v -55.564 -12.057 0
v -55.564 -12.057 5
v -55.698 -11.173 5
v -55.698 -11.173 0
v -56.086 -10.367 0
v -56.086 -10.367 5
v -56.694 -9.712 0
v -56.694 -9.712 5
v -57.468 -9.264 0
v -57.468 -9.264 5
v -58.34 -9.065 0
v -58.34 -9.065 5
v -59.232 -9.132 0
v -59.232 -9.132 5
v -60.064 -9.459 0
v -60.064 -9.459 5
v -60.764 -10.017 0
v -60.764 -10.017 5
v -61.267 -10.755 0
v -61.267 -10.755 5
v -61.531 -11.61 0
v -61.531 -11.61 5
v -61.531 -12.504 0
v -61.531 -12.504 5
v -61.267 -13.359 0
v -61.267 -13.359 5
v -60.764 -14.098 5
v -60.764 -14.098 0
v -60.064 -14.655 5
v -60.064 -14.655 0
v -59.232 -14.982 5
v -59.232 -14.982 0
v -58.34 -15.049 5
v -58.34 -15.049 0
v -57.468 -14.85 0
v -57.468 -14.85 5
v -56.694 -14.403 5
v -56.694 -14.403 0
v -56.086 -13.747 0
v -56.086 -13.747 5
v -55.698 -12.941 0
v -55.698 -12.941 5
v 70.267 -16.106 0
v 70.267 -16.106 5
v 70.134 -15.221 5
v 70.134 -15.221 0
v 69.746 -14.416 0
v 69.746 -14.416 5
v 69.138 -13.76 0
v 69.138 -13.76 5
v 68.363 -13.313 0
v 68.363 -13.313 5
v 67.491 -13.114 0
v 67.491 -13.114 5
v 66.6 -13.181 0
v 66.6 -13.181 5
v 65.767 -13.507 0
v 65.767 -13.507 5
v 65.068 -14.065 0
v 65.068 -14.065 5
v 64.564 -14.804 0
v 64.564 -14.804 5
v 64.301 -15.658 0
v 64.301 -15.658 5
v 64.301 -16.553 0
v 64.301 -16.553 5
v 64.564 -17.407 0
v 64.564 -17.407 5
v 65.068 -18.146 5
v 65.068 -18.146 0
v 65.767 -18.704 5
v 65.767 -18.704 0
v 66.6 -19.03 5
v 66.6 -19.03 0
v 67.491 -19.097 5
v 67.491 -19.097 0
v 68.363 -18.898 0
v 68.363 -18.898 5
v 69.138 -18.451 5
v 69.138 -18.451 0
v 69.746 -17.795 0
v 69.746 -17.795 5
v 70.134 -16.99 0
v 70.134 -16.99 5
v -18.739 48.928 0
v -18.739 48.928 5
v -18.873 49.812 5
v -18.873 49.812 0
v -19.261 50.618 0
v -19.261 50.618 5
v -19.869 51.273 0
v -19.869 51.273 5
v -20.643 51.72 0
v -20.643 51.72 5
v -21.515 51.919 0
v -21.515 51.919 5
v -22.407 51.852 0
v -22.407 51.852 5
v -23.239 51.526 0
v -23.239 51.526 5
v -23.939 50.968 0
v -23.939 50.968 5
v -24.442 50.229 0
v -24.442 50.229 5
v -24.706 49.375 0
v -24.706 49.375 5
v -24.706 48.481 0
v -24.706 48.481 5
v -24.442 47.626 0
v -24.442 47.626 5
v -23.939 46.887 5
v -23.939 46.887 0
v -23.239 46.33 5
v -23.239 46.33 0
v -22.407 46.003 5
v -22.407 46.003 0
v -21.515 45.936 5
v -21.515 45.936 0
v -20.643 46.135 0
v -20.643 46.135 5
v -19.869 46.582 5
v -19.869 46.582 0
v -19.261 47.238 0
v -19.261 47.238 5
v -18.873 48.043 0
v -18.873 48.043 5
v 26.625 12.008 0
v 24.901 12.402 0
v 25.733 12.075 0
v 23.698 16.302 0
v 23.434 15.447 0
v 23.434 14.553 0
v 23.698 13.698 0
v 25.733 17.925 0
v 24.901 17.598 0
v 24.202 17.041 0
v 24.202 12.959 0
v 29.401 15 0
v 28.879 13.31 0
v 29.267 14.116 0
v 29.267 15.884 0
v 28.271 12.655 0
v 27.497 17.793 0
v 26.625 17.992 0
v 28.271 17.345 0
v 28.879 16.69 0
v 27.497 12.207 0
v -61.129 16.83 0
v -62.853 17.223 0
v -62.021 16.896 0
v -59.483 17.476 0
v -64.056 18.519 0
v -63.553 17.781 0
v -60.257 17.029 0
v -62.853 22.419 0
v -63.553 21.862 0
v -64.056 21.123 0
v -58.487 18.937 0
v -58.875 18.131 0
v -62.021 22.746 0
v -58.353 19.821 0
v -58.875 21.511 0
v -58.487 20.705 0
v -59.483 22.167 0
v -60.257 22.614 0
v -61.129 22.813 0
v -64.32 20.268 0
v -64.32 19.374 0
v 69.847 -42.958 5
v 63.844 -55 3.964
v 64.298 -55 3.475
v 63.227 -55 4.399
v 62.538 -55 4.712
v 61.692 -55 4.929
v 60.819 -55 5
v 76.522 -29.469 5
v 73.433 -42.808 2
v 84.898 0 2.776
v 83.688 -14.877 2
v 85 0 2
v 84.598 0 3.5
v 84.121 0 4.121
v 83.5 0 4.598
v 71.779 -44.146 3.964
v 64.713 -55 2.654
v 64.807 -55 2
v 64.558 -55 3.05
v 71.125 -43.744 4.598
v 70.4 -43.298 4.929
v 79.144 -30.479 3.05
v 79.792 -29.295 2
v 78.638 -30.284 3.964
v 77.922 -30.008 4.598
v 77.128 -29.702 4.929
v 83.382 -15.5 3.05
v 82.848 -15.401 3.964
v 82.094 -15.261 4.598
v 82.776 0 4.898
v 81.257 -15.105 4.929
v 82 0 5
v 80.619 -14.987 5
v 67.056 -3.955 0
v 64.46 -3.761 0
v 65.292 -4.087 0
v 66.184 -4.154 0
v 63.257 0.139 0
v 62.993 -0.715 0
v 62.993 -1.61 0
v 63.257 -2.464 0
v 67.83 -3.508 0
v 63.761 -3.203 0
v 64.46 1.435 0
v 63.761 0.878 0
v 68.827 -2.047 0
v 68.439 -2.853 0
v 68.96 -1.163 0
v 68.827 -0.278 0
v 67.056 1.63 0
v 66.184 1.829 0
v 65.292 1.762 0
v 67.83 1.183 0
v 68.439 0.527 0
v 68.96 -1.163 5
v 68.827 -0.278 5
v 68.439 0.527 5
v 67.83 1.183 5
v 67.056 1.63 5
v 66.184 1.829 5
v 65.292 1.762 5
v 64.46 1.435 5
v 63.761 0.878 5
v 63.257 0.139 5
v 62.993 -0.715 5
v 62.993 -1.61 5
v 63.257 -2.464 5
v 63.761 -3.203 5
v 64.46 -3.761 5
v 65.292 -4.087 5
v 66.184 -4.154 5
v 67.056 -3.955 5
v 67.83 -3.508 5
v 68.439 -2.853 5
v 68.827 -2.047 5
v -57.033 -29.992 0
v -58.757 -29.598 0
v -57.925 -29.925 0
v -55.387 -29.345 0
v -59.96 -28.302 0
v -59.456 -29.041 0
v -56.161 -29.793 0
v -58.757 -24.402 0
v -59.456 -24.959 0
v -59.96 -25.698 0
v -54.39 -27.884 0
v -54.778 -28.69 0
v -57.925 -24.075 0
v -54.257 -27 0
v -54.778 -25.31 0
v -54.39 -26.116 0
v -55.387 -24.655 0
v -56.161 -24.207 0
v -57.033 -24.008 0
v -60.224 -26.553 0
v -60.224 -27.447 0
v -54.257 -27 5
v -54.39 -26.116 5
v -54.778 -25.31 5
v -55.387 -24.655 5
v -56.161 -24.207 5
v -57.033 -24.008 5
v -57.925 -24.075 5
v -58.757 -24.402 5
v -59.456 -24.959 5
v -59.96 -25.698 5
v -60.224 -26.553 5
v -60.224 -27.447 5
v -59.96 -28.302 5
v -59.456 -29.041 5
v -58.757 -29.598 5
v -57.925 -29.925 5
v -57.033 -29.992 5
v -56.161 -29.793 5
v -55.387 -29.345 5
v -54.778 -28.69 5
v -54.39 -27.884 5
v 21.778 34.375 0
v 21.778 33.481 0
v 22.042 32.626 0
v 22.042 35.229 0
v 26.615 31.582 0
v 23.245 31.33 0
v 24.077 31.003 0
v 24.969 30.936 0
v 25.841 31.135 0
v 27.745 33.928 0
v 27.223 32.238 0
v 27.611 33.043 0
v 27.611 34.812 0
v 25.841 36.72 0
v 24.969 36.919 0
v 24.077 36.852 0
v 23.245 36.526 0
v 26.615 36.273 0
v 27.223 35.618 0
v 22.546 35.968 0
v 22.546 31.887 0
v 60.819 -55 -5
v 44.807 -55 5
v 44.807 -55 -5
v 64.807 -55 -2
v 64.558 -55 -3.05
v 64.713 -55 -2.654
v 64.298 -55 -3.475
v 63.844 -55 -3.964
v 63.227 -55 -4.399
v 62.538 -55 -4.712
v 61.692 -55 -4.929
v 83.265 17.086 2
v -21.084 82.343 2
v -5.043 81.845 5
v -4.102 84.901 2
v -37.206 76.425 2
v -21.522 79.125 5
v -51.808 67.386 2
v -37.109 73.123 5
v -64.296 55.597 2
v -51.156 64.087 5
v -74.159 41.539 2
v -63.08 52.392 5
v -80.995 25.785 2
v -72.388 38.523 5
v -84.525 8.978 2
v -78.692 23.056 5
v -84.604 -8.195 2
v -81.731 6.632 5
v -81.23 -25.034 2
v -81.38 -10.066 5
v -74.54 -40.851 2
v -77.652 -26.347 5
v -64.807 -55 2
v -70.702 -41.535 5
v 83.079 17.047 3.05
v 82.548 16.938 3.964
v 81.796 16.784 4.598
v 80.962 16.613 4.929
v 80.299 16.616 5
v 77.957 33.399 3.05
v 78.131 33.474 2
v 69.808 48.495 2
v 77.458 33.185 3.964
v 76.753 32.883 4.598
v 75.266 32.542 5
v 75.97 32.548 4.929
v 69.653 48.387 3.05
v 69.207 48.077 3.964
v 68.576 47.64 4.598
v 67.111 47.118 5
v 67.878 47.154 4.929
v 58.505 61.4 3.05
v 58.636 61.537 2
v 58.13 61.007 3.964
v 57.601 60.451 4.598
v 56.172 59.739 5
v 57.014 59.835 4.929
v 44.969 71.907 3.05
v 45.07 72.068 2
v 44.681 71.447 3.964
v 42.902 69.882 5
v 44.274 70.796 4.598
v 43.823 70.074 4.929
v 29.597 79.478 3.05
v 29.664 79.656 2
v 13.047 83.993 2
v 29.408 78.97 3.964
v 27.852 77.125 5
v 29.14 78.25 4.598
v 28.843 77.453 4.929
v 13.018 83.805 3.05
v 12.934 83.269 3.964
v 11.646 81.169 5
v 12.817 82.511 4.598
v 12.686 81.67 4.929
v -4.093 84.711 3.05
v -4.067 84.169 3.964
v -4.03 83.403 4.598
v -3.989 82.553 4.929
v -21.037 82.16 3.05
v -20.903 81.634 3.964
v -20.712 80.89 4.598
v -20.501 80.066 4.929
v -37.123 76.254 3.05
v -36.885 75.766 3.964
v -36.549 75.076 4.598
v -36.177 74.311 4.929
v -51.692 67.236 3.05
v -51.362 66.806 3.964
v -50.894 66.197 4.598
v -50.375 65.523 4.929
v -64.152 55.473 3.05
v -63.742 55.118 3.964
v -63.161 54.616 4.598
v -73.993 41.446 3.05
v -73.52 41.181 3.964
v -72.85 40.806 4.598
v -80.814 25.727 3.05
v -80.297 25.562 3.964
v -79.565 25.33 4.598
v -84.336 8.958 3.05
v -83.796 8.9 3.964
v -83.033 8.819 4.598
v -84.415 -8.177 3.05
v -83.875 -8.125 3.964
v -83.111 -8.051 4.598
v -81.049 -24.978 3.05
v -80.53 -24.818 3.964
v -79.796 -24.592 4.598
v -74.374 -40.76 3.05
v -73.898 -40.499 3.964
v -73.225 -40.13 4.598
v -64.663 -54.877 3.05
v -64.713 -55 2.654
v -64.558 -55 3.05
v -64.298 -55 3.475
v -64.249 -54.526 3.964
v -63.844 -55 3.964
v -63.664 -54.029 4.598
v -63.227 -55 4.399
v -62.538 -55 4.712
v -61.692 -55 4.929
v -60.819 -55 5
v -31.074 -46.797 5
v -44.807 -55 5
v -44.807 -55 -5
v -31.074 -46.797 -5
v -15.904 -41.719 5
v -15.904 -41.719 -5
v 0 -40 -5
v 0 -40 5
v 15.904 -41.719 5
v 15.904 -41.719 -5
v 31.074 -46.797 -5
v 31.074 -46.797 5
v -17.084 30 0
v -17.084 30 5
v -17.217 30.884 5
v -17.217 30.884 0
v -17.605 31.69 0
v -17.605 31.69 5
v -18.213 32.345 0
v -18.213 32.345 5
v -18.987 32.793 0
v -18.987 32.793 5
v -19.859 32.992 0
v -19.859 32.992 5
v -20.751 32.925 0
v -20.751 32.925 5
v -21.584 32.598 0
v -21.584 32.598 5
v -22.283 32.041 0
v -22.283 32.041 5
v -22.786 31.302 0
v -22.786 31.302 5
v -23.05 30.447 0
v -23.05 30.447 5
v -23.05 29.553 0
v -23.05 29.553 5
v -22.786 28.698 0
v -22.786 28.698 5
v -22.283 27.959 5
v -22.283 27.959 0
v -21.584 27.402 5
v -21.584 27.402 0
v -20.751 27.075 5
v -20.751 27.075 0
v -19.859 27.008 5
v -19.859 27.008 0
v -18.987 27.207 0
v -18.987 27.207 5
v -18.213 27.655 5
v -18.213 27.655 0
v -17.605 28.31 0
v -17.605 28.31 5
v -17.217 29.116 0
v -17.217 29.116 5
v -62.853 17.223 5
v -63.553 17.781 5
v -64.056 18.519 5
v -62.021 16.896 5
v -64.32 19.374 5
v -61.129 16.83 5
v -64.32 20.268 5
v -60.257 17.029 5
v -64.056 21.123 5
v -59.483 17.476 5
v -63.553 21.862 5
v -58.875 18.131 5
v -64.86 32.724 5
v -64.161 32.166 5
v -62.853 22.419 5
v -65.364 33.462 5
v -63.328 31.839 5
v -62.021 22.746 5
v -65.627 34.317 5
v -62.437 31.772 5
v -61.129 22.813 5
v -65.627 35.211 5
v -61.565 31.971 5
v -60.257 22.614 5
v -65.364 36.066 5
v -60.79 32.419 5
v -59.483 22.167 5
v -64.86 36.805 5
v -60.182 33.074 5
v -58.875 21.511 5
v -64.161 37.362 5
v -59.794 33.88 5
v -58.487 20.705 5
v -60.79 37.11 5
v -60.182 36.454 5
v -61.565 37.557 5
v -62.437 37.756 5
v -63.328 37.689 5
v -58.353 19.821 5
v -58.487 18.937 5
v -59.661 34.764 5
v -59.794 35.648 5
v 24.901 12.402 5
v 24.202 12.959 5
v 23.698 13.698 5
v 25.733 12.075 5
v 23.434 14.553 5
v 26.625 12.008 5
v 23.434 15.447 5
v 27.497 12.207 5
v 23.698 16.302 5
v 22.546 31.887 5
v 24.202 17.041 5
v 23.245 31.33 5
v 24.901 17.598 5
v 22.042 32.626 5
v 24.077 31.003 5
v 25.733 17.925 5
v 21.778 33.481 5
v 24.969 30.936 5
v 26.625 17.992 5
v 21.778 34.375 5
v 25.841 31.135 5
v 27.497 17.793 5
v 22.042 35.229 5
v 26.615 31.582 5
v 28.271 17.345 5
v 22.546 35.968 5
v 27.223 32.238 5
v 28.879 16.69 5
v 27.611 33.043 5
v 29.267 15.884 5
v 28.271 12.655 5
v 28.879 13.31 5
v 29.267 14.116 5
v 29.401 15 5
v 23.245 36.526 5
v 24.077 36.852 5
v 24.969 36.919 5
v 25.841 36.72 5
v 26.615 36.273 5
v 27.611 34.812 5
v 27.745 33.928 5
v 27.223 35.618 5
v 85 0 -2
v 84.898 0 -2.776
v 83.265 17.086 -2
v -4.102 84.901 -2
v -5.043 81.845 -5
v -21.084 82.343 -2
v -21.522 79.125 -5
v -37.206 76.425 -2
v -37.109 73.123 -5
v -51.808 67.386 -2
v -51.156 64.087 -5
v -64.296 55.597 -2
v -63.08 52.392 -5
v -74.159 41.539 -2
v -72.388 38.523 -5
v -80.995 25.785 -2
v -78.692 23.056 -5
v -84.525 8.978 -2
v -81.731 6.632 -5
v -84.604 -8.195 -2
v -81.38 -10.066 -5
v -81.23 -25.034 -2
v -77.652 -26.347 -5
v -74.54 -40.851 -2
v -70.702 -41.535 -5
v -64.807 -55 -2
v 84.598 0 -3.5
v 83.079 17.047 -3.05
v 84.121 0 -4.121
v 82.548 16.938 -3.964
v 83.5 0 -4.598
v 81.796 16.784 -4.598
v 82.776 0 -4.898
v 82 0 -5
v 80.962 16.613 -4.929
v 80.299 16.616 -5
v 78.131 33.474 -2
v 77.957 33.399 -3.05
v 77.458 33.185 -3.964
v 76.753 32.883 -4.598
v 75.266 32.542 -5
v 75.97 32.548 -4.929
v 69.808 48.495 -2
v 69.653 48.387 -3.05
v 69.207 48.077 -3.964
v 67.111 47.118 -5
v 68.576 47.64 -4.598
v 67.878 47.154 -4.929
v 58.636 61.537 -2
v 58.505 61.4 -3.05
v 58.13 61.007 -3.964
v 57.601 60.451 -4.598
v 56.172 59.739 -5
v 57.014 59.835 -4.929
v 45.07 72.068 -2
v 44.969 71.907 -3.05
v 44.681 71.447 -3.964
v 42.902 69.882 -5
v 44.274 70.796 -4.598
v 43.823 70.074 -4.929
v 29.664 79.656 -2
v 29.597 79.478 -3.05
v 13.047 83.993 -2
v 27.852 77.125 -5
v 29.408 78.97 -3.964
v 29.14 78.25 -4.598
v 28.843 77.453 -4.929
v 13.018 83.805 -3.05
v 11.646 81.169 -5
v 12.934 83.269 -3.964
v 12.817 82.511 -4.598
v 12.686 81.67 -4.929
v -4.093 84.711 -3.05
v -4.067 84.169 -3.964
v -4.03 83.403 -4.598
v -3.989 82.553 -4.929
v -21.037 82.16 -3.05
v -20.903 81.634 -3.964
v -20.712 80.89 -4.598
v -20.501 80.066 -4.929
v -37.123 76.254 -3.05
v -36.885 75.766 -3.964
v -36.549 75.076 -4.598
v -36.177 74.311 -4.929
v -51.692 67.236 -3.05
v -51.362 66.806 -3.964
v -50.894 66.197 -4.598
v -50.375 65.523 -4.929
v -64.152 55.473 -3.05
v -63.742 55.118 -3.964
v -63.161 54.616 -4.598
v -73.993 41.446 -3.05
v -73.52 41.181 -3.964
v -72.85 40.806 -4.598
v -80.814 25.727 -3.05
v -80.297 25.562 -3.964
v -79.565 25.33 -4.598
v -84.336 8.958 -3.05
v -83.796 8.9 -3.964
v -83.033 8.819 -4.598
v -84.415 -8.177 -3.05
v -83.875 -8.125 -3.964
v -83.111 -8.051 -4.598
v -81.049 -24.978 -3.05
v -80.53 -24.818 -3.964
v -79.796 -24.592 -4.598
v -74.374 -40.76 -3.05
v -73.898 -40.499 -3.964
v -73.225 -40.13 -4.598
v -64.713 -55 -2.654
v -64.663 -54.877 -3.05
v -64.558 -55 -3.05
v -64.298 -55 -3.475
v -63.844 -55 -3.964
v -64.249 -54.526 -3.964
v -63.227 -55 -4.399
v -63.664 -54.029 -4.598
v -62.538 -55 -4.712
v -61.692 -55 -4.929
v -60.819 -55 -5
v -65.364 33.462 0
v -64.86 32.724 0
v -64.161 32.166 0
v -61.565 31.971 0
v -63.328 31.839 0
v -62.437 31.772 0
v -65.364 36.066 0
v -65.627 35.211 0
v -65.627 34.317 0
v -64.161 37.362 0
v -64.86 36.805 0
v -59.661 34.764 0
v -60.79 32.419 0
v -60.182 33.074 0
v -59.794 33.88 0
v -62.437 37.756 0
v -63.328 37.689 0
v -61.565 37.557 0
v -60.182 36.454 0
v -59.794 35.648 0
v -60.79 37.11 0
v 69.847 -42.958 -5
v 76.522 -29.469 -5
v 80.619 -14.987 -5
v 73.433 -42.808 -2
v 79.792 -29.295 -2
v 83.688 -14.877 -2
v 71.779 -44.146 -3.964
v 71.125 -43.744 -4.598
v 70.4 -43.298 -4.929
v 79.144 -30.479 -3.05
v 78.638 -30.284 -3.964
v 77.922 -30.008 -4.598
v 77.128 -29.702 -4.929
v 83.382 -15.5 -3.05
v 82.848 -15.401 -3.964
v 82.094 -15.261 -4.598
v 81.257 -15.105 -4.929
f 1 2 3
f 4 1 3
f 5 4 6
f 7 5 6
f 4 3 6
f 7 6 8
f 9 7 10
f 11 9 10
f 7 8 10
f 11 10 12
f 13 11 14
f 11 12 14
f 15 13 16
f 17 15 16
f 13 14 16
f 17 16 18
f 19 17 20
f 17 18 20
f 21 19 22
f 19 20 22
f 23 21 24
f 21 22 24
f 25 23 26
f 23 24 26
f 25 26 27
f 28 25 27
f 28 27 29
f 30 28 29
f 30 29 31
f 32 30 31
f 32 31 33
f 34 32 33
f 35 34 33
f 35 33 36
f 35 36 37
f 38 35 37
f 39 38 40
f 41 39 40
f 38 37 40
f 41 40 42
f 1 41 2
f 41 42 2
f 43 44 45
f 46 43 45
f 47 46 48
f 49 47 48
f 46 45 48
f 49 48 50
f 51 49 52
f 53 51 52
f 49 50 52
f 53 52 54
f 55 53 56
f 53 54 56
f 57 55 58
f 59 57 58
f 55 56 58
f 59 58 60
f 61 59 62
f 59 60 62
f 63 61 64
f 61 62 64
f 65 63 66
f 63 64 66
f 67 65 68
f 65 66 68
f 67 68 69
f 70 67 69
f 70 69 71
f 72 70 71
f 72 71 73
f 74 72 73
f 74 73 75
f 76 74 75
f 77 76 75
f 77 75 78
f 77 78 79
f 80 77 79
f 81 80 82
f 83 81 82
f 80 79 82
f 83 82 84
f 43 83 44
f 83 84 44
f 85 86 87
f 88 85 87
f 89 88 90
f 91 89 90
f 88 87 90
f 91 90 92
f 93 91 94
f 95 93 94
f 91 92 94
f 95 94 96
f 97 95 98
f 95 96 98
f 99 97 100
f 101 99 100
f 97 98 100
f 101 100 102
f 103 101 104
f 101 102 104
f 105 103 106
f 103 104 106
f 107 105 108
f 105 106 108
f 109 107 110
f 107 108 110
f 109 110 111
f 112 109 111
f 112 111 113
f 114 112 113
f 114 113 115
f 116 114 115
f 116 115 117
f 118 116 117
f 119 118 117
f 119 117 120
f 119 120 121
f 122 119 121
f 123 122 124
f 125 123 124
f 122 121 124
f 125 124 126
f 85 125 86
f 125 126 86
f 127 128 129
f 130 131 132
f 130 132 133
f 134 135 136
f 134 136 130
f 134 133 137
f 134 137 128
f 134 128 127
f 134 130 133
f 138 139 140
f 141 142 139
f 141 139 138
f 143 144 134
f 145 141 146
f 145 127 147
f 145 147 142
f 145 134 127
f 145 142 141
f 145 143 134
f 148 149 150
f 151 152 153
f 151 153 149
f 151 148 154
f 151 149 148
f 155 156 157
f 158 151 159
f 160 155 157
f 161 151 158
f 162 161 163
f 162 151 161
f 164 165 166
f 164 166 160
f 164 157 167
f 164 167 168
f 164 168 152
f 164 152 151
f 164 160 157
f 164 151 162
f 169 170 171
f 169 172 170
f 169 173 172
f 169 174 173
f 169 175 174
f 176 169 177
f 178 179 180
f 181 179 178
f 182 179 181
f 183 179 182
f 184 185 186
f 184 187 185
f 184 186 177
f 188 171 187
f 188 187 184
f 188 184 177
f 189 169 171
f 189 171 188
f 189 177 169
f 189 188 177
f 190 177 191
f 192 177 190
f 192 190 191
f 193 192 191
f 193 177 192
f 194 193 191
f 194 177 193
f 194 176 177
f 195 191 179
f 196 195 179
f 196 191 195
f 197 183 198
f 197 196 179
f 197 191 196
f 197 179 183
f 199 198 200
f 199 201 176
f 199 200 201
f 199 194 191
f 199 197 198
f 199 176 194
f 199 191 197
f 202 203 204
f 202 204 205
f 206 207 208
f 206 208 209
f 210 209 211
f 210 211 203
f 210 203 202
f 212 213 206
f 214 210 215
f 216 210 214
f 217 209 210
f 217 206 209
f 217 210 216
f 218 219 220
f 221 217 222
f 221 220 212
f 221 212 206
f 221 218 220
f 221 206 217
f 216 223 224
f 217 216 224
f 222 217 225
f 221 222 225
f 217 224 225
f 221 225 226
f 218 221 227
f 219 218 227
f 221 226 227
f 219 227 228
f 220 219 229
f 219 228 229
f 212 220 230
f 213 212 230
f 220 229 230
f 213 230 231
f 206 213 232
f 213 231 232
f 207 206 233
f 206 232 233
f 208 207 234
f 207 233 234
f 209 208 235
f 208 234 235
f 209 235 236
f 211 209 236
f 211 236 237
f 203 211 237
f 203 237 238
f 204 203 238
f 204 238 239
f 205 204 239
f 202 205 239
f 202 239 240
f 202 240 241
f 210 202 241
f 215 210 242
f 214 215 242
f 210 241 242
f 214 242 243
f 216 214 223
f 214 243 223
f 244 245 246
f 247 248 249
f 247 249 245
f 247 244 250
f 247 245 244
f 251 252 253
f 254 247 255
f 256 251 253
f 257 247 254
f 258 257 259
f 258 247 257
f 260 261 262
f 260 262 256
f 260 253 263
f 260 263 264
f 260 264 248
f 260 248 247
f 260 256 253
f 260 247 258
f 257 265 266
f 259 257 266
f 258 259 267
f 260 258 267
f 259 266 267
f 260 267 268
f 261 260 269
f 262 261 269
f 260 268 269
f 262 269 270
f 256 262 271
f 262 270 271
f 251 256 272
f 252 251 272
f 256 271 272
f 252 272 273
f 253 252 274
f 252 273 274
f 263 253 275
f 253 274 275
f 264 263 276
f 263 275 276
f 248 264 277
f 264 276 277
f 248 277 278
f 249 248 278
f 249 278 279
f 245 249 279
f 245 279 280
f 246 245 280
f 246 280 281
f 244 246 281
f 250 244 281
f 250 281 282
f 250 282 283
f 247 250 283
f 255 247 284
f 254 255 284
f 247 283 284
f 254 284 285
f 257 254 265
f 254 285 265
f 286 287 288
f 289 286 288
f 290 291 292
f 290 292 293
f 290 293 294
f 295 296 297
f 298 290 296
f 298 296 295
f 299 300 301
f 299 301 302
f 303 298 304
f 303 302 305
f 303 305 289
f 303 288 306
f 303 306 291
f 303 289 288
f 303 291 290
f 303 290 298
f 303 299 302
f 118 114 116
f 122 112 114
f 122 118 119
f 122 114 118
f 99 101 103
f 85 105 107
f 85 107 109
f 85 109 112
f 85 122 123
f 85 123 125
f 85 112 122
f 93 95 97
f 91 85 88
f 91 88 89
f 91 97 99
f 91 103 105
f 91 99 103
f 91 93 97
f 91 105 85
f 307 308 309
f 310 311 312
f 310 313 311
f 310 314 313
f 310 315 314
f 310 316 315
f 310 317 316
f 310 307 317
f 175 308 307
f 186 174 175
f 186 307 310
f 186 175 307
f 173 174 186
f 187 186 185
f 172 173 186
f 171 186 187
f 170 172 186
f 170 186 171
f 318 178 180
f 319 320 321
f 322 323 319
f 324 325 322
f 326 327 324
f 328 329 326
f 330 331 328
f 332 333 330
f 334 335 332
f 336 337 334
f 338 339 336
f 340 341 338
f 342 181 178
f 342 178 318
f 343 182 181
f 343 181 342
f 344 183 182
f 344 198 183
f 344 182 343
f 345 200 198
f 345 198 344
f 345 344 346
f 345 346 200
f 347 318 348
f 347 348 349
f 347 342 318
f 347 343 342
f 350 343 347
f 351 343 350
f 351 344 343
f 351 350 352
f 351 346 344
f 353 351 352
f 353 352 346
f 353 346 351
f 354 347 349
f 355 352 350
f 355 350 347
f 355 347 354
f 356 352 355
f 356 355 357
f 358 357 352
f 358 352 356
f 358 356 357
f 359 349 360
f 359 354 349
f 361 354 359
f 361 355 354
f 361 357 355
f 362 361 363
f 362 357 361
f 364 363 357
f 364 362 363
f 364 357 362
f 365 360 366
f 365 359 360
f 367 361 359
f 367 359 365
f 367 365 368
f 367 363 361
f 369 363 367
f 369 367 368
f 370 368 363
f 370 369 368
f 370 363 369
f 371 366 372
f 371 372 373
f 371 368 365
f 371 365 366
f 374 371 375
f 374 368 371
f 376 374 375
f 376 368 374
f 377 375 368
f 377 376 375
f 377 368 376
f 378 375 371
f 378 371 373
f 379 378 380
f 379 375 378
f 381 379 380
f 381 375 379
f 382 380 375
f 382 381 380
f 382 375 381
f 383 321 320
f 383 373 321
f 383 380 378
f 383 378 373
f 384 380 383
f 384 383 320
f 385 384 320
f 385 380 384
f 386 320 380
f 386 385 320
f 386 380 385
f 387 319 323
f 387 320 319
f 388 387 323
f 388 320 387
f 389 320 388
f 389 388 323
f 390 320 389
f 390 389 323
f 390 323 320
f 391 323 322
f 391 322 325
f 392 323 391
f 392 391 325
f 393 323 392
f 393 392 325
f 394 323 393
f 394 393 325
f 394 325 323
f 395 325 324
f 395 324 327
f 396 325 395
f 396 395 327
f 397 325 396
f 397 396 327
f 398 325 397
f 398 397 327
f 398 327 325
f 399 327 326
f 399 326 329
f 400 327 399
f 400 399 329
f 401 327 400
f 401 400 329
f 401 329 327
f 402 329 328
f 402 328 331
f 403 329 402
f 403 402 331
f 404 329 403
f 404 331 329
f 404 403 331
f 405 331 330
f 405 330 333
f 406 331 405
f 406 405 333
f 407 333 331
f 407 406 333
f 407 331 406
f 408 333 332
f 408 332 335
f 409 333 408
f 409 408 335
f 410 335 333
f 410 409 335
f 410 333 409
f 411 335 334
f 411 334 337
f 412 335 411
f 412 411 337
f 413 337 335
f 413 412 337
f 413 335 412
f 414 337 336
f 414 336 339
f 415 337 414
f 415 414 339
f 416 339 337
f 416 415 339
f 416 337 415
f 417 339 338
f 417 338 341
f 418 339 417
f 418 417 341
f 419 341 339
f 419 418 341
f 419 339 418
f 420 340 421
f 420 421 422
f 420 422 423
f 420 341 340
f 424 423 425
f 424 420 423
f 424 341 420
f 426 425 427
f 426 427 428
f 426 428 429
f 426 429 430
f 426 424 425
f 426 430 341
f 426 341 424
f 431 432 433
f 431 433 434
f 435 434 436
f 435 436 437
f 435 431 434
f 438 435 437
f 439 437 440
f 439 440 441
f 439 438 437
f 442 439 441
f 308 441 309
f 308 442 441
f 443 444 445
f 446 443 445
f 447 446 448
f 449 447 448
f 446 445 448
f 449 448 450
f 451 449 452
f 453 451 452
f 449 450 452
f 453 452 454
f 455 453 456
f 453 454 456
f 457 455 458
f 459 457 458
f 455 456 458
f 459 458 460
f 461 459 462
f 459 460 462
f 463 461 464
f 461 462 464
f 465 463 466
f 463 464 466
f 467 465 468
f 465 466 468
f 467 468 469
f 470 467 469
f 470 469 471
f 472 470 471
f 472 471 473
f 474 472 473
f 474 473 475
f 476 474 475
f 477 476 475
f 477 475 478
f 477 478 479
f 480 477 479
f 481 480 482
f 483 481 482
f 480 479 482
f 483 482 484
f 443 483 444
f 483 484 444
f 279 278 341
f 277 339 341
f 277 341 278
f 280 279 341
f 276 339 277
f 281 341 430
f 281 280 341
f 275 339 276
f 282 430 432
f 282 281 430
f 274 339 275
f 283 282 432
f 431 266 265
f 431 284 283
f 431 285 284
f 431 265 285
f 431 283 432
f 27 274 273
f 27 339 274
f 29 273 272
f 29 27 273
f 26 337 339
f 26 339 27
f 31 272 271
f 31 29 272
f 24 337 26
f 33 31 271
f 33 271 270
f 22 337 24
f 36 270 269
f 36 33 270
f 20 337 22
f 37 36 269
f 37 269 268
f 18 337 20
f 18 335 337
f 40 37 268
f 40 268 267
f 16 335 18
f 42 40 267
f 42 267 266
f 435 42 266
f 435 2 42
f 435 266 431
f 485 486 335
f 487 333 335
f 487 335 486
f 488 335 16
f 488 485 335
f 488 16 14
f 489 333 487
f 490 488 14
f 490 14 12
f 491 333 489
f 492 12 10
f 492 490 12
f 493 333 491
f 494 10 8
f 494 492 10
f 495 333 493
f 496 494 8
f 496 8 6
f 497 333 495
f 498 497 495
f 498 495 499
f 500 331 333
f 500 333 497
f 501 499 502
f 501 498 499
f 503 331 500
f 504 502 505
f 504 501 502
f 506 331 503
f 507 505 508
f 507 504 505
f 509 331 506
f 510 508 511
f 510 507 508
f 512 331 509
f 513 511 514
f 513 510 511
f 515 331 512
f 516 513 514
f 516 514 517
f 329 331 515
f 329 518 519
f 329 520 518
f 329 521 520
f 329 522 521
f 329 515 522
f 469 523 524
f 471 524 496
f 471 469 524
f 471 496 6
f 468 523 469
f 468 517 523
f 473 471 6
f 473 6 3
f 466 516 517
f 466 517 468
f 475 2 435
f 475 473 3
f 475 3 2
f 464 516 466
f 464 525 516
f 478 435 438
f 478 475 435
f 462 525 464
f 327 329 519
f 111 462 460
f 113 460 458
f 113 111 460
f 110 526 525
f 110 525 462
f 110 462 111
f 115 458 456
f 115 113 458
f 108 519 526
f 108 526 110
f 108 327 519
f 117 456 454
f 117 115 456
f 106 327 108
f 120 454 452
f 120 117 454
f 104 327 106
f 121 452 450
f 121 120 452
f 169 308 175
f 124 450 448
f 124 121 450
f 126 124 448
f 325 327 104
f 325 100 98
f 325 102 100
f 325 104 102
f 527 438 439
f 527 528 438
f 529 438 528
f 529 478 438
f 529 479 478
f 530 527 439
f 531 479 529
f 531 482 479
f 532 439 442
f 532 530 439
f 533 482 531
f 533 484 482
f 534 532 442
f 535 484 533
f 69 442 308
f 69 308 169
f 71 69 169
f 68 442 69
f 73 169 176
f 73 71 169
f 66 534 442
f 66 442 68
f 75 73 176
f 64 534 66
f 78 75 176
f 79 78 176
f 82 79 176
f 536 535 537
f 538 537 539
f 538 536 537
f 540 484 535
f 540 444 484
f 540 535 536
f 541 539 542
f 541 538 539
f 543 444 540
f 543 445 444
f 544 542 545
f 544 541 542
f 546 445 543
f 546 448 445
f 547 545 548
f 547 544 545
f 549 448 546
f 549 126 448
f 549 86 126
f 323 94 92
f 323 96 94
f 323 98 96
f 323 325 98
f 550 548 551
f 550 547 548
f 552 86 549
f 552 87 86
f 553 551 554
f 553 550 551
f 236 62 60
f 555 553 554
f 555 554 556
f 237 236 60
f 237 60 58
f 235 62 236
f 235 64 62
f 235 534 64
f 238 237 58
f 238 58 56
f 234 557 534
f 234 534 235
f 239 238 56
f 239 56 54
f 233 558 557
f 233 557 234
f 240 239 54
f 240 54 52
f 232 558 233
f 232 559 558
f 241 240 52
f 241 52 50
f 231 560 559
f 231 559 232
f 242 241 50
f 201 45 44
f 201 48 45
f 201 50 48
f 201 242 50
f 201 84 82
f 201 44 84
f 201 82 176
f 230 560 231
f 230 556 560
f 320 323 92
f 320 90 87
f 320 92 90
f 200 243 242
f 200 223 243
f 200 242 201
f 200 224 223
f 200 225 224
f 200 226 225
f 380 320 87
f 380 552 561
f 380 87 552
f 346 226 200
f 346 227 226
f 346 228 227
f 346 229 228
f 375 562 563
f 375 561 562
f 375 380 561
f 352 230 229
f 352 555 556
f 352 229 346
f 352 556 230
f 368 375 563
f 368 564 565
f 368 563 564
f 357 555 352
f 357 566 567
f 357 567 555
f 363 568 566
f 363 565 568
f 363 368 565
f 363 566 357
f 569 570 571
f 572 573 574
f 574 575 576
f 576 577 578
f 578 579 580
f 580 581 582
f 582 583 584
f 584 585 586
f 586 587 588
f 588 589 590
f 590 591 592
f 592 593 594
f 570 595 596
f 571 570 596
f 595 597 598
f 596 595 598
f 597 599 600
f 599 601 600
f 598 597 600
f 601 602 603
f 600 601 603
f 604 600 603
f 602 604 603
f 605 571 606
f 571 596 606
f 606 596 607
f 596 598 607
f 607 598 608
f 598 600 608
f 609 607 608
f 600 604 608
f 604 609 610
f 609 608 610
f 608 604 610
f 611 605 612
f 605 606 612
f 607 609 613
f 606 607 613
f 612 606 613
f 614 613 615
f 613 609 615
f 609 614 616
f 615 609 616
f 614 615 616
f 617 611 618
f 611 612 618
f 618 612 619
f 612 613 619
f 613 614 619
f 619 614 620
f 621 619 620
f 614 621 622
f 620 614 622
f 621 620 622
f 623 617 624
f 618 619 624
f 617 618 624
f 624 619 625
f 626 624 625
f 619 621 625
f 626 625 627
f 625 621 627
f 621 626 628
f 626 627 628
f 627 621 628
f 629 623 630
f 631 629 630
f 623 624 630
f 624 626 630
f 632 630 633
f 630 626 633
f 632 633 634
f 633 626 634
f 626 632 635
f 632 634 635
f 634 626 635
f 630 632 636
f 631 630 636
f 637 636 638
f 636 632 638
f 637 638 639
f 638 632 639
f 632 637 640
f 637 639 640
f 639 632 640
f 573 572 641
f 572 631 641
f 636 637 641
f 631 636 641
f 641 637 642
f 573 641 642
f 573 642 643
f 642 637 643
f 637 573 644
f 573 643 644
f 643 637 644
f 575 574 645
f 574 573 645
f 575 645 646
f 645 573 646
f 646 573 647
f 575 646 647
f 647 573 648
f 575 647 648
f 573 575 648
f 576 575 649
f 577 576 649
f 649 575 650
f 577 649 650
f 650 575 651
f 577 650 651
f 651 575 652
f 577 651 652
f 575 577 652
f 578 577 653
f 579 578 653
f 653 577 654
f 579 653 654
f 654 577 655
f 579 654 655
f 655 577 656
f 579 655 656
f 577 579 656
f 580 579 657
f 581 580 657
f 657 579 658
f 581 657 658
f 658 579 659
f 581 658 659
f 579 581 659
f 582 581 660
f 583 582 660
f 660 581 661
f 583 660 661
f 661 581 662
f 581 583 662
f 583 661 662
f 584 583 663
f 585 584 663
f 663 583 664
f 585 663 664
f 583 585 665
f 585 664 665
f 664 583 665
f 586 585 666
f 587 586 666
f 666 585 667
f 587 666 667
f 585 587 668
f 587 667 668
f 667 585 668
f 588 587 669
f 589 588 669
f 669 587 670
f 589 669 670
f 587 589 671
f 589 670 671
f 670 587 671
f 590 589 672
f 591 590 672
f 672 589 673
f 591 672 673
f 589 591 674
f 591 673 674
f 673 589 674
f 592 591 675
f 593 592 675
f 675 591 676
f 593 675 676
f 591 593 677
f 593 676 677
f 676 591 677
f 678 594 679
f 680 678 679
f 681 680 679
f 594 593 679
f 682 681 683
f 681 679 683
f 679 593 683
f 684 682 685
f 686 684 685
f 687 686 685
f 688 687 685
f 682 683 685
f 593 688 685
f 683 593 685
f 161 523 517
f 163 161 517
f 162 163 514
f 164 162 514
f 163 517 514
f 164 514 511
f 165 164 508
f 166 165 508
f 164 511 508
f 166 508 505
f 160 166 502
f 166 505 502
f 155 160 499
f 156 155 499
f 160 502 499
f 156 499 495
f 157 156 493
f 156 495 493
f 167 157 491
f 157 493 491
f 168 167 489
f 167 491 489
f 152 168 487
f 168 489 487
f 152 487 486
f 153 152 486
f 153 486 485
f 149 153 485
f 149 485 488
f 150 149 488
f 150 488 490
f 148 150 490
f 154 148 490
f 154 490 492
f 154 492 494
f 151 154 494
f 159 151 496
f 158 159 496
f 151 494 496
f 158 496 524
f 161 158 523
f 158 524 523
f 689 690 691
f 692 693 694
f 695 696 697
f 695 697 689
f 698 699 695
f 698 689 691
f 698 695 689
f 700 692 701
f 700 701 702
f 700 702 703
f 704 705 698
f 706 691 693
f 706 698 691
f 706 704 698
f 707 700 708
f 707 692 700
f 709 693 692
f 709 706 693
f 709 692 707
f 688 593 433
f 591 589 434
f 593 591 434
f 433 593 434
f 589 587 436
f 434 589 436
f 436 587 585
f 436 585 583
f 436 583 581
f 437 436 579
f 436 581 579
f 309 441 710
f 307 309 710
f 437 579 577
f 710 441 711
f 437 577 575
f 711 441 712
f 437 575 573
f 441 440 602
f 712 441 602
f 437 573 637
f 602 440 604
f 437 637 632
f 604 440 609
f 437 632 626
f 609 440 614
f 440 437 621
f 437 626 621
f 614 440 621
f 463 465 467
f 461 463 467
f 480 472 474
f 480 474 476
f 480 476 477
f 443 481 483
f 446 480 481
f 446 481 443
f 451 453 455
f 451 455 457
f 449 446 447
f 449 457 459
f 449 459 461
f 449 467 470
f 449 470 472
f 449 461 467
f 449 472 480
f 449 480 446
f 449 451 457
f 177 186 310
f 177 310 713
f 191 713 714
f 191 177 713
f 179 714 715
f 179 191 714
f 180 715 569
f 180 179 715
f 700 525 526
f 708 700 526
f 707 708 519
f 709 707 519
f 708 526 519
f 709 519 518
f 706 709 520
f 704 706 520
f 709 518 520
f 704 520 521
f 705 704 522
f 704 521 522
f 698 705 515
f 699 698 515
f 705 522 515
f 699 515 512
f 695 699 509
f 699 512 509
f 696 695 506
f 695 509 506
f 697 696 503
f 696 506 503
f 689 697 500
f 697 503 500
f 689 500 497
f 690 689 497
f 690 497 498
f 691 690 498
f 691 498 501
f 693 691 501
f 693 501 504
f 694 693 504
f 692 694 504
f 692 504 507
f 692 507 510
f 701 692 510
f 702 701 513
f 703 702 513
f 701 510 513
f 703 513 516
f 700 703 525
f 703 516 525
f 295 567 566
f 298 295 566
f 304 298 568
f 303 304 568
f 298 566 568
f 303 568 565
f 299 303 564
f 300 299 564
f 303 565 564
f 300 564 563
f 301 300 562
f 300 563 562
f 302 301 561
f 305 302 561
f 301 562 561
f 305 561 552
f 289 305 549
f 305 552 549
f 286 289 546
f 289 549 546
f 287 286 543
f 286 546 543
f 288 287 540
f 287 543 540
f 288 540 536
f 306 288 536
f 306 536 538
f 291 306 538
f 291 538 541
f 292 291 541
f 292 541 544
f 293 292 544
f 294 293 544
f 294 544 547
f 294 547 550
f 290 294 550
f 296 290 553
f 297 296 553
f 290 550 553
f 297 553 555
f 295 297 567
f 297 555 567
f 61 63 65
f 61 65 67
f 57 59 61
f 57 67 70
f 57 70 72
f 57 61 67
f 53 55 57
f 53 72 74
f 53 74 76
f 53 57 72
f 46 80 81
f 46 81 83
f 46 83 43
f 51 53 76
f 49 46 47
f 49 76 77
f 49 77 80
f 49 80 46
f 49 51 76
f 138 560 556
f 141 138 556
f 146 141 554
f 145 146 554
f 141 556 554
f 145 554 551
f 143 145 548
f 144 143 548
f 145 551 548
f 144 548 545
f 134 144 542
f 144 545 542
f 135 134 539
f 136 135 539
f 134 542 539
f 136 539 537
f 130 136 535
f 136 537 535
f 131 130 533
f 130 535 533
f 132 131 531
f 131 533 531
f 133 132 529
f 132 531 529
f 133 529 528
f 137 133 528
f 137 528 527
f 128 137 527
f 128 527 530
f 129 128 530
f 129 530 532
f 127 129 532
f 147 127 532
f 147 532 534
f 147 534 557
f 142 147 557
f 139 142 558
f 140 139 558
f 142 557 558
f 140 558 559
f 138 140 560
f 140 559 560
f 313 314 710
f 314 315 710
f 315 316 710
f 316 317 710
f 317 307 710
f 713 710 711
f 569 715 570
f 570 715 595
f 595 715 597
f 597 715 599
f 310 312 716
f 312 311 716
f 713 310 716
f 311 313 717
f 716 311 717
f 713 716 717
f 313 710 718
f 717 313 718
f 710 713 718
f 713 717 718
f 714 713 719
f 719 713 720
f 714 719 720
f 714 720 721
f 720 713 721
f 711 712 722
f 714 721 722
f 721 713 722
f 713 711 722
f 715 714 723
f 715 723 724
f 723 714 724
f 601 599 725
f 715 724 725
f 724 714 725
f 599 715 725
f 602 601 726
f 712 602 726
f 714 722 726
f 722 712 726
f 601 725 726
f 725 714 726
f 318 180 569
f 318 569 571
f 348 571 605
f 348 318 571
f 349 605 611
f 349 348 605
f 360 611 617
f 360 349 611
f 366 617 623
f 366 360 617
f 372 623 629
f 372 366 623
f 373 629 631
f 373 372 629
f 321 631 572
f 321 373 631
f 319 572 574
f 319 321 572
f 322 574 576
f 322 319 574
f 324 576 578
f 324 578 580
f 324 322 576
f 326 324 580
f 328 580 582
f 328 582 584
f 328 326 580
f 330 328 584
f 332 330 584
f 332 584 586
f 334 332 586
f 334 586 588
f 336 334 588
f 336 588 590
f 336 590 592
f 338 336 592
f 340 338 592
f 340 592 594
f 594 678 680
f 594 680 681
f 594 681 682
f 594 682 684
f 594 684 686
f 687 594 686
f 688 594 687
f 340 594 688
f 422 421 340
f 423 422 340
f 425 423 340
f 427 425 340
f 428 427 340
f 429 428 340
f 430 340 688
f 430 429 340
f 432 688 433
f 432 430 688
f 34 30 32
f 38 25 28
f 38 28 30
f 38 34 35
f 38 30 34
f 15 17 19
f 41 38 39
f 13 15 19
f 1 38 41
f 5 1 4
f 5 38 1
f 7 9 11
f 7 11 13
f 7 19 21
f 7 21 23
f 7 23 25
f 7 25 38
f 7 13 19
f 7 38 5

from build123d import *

# Parameters (mm, degrees)
EXTRUDE_1_DEPTH     = 5
SKETCH_2_R          = 3
CUT_EXTRUDE_2_DEPTH = 5
FILLET_1_R          = 3


with BuildPart() as part:
    # 草圖1 → 伸長1 (new, symmetric)
    with BuildSketch(Plane.XY):
        with BuildLine():
            ThreePointArc((85, 0), (-29.294798227, 79.792322919), (-64.807406984, -55))
            Line((-64.807406984, -55), (-44.807406984, -55))
            ThreePointArc((-44.807406984, -55), (0, -40), (44.807406984, -55))
            Line((44.807406984, -55), (64.807406984, -55))
            ThreePointArc((64.807406984, -55), (79.792322919, -29.294798227), (85, 0))
        make_face()
    extrude(amount=EXTRUDE_1_DEPTH, both=True)

    # 草圖2 → 伸長2 (cut)
    with BuildSketch(Plane.XY.offset(5)):
        with Locations((-57.257089563, -27)):
            Circle(SKETCH_2_R)
        with Locations((-58.564425704, -12.057079529)):
            Circle(SKETCH_2_R)
        with Locations((-61.353409472, 19.82115081)):
            Circle(SKETCH_2_R)
        with Locations((-62.660745613, 34.764071282)):
            Circle(SKETCH_2_R)
        with Locations((-21.739469319, 48.927699264)):
            Circle(SKETCH_2_R)
        with Locations((-20.083510207, 30)):
            Circle(SKETCH_2_R)
        with Locations((24.744753323, 33.927699264)):
            Circle(SKETCH_2_R)
        with Locations((26.400712435, 15)):
            Circle(SKETCH_2_R)
        with Locations((65.959911557, -1.162611685)):
            Circle(SKETCH_2_R)
        with Locations((67.267247699, -16.105532157)):
            Circle(SKETCH_2_R)
    extrude(amount=-CUT_EXTRUDE_2_DEPTH, mode=Mode.SUBTRACT)

    # 圓角1
    fillet_1_edges = [part.edges().sort_by_distance(p)[0] for p in [
        (0, 85, 5),
        (0, 85, -5),
    ]]
    fillet(fillet_1_edges, radius=FILLET_1_R)


solid = part.part
